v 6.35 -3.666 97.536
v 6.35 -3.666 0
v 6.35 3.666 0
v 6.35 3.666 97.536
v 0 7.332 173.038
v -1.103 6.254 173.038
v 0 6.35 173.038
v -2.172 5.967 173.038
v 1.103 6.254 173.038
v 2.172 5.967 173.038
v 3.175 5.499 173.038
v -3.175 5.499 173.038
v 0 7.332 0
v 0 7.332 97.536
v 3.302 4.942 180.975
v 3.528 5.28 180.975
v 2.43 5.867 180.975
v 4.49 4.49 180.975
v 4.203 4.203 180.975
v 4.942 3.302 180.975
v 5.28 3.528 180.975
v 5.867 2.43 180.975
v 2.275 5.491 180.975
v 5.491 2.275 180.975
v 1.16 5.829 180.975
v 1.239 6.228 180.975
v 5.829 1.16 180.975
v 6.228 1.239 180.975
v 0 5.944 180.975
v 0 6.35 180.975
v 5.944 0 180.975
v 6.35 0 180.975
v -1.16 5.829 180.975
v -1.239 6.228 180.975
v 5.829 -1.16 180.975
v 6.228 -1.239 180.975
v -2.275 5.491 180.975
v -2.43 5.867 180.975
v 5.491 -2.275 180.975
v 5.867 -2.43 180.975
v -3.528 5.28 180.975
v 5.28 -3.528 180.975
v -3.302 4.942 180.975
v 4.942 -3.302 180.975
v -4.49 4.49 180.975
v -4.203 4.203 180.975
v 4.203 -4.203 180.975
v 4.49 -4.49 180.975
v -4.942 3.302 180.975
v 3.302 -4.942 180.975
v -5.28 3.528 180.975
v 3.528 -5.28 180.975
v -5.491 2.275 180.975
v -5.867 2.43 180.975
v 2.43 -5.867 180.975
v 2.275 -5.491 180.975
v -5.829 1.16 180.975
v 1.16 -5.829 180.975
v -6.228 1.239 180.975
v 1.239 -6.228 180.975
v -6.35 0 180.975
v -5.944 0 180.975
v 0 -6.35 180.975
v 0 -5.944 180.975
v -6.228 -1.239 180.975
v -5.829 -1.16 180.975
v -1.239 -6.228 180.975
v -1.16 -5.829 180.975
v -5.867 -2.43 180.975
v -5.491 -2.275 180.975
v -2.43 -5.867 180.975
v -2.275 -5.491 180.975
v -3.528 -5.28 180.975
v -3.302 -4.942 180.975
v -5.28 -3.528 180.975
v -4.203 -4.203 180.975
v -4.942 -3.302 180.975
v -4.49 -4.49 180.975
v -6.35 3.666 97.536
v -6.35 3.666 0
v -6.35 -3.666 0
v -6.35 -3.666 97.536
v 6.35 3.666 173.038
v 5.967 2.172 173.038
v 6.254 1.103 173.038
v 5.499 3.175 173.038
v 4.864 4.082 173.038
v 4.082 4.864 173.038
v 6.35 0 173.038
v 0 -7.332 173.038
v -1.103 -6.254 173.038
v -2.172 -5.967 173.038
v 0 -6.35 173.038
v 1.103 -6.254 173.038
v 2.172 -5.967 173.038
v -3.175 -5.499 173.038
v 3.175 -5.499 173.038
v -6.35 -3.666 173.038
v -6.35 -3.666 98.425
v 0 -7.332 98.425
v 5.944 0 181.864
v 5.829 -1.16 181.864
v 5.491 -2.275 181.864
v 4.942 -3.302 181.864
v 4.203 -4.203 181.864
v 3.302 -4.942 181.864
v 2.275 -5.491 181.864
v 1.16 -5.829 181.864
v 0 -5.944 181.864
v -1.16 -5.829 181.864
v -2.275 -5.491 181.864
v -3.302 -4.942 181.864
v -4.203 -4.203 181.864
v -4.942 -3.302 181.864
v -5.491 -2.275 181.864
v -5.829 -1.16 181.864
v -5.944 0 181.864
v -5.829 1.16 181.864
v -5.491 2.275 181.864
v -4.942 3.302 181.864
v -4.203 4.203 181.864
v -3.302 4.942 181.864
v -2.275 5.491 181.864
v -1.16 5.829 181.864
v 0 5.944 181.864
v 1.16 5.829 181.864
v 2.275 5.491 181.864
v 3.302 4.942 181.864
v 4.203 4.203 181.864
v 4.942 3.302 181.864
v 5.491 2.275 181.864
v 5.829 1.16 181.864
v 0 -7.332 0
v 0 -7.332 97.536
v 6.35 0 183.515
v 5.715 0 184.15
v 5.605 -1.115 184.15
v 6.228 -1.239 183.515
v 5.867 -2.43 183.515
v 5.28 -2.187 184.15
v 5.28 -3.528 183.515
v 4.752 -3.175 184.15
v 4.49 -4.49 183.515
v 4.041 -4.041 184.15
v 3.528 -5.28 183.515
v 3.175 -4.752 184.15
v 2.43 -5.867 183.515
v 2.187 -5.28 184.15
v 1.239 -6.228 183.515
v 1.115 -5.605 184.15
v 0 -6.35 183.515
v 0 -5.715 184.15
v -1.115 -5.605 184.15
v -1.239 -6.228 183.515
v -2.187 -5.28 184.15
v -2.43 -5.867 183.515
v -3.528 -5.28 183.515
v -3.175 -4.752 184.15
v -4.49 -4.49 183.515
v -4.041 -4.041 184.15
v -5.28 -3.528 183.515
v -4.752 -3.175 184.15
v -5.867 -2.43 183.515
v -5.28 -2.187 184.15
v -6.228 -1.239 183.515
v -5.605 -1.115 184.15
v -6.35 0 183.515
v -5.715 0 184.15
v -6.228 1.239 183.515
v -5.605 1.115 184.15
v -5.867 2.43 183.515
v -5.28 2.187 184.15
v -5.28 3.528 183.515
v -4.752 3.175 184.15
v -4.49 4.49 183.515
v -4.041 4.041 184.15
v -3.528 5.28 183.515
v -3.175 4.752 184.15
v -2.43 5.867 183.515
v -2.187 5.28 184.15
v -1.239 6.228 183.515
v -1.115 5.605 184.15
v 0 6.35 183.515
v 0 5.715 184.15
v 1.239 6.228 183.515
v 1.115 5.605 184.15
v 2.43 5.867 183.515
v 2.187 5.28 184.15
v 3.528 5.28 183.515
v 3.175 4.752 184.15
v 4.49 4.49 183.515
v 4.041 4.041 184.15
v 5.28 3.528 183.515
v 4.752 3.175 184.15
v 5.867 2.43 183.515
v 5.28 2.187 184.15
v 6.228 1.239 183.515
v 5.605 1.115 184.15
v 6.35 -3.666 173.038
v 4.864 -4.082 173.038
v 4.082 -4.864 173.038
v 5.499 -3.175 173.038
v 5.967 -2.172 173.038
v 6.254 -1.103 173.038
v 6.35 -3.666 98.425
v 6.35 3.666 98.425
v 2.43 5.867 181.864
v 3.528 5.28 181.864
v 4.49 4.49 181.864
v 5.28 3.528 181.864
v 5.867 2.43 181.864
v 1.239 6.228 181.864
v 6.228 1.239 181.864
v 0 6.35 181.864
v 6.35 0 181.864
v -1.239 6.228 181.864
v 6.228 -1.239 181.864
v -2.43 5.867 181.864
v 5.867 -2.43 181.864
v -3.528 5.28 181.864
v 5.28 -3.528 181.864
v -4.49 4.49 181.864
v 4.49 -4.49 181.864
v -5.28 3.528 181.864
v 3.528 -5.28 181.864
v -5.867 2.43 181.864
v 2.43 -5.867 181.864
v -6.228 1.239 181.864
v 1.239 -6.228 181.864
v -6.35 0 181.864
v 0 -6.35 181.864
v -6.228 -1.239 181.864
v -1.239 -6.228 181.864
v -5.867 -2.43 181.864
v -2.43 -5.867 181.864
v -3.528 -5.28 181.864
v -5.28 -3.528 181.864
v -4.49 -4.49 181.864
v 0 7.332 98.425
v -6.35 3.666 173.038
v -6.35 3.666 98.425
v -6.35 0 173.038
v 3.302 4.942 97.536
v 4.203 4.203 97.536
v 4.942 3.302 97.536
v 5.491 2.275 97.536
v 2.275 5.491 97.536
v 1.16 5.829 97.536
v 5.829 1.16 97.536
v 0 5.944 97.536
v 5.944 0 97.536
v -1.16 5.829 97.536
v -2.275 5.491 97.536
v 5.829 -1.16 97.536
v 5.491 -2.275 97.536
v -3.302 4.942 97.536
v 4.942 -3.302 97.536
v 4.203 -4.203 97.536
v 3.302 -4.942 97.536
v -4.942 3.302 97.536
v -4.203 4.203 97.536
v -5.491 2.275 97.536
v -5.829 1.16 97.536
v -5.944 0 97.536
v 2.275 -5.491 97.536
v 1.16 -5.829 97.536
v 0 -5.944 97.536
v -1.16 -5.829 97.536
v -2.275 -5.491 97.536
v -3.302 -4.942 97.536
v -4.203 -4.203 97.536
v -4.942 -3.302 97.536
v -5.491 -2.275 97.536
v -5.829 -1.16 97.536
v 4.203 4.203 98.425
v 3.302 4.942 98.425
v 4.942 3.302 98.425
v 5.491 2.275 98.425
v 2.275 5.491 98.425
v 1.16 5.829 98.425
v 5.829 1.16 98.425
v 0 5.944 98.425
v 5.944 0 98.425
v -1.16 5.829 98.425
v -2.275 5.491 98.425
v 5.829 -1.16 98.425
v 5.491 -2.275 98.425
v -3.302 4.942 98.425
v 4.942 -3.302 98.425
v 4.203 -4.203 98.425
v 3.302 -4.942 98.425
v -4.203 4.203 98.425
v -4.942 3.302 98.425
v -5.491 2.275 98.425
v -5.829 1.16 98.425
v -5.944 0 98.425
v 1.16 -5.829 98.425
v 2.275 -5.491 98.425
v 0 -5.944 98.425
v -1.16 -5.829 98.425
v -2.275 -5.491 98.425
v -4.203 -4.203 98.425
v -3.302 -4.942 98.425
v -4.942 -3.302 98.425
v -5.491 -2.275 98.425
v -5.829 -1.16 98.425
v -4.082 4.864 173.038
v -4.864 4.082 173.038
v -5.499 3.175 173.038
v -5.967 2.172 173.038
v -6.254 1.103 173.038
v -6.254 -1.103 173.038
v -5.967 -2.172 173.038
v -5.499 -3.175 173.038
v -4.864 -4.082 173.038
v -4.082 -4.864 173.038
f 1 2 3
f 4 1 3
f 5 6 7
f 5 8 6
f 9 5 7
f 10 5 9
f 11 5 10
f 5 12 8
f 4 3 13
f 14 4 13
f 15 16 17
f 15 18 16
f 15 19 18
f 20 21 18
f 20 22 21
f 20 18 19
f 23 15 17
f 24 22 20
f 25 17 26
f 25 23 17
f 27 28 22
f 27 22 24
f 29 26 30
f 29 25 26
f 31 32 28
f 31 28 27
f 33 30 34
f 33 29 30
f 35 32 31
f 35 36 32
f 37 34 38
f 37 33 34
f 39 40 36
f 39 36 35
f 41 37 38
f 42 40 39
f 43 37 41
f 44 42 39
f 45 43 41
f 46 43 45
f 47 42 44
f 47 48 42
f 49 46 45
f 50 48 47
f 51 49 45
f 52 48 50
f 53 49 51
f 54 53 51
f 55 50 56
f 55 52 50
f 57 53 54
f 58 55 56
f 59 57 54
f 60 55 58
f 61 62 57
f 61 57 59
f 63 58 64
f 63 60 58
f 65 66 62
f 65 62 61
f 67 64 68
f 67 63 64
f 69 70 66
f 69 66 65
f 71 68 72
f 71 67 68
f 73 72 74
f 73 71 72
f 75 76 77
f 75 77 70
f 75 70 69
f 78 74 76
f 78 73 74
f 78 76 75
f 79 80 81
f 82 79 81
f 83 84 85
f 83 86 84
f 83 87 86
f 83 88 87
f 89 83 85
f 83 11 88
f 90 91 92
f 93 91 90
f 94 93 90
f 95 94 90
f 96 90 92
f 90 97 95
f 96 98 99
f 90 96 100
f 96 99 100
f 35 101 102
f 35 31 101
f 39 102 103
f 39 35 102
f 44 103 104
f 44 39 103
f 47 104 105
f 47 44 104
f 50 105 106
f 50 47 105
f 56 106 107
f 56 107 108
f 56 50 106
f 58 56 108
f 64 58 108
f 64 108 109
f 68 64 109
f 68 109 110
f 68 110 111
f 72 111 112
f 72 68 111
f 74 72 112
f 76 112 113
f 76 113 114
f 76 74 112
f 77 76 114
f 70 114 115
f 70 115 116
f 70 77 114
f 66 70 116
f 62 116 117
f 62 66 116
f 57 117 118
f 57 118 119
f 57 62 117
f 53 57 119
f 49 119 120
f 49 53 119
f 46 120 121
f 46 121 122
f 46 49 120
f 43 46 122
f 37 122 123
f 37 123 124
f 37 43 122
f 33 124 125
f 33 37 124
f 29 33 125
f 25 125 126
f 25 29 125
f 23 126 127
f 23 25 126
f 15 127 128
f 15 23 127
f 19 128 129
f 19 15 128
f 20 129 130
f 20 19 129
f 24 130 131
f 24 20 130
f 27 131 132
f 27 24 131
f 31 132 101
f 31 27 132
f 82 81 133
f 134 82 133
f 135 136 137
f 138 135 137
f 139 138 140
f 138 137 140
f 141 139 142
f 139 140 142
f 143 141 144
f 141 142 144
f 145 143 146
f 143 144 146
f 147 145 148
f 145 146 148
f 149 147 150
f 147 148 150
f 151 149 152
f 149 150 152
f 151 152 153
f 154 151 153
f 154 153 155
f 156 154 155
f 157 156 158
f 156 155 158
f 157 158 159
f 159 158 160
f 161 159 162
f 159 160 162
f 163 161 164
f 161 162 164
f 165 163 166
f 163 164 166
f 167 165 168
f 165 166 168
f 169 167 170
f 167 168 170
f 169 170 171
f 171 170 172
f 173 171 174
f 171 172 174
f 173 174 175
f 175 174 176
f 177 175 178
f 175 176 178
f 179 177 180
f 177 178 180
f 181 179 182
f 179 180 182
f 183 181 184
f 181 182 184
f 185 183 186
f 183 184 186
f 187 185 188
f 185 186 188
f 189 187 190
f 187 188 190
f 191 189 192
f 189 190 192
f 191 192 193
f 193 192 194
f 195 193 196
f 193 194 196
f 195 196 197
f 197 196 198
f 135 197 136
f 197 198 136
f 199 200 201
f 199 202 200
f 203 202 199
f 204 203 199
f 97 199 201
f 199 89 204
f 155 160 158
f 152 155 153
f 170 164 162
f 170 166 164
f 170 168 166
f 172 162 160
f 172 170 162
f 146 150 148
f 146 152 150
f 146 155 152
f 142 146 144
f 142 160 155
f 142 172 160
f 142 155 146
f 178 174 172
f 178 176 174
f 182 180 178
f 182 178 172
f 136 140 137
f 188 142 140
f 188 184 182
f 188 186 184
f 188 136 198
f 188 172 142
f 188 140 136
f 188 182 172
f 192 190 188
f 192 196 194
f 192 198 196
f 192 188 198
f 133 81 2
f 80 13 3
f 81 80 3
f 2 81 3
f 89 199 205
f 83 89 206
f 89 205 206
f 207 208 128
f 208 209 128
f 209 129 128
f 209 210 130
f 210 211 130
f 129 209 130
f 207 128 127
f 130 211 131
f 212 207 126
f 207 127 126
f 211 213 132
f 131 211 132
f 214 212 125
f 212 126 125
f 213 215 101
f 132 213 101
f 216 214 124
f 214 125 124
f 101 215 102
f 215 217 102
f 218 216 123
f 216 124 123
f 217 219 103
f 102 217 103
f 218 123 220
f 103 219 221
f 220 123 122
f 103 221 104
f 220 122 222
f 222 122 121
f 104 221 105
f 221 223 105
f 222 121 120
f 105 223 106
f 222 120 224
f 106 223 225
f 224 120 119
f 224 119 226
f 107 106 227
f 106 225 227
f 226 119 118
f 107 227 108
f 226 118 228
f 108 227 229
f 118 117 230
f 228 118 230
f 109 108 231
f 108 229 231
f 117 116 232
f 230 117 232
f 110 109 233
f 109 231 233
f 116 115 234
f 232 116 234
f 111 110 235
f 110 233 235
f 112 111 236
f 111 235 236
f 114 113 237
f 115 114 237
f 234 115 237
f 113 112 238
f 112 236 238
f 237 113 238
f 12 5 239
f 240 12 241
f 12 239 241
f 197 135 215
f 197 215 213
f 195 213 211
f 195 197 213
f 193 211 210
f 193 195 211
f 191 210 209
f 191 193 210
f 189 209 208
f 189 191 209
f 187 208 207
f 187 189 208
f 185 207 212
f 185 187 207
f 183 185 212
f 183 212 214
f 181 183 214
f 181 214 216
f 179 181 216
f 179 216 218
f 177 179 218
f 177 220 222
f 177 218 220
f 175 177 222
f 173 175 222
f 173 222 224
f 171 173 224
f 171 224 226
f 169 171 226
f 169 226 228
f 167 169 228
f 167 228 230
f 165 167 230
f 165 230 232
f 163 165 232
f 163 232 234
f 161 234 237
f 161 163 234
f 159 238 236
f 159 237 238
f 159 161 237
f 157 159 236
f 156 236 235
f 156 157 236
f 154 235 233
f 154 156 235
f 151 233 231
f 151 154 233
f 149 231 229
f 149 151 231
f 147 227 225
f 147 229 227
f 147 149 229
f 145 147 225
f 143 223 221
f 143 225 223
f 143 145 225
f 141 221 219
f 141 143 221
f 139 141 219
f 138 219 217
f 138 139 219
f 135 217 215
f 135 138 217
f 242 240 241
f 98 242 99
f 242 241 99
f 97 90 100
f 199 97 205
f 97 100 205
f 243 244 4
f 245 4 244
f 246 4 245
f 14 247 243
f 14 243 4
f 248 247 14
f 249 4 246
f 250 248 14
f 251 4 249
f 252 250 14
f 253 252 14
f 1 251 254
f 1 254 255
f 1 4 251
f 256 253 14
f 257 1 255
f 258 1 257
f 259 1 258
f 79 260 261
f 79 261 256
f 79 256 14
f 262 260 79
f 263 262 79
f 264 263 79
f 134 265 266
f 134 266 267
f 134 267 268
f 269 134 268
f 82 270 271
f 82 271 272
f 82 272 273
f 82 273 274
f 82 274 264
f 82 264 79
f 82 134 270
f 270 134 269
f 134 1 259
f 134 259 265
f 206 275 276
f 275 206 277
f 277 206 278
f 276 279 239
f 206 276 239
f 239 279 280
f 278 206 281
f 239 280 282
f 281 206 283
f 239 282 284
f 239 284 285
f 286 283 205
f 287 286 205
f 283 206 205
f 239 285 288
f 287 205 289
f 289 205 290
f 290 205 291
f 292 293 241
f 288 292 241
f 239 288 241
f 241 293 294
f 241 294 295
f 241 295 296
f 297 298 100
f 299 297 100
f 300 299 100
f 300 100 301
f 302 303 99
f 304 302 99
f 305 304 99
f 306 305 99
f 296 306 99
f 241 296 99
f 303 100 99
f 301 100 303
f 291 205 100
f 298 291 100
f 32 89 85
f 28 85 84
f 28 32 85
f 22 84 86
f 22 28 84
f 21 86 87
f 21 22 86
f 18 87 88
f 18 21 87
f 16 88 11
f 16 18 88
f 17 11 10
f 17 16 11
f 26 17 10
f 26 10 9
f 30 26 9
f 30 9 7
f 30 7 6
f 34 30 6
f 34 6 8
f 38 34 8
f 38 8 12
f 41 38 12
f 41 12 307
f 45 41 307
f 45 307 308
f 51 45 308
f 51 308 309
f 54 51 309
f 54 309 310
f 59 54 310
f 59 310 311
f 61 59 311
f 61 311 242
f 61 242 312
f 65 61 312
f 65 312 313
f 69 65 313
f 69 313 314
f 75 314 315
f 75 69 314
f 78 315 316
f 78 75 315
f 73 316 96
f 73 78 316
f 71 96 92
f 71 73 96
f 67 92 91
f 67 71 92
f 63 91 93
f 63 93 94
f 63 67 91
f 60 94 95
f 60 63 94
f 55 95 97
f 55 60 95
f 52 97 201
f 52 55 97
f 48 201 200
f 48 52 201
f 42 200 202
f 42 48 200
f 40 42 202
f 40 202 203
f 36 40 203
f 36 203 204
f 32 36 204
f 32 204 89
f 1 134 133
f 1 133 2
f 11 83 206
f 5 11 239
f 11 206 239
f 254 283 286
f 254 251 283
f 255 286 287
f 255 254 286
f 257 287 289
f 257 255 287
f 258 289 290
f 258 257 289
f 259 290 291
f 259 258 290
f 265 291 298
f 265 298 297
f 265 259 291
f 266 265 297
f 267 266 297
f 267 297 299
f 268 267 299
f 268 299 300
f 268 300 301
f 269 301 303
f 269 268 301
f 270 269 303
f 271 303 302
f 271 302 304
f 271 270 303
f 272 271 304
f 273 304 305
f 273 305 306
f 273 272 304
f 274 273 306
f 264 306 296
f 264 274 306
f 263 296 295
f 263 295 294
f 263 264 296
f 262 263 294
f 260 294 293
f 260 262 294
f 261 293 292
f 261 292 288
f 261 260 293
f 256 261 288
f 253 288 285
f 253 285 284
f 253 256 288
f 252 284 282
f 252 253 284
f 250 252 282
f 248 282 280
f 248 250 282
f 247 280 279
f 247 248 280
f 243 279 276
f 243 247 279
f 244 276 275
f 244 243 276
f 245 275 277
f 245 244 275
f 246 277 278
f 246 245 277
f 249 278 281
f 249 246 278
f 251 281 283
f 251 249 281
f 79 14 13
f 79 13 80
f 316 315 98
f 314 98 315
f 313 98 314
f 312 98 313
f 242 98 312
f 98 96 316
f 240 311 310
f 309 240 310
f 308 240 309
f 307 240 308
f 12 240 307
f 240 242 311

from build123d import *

# Parameters (mm, degrees)
BOSS_EXTRUDE1_DEPTH = 184.15
SKETCH2_R           = 7.332348419
SKETCH2_R_2         = 6.35
CUT_EXTRUDE1_DEPTH  = 11.1125
SKETCH3_W           = 0.889
SKETCH3_H           = 0.4064
SKETCH3_H_2         = 3.038077808
CHAMFER1_SIZE       = 0.635


with BuildPart() as part:
    # Sketch1 → Boss-Extrude1 (new body)
    with BuildSketch(Plane.XY):
        Polygon((0, 7.332348419), (-6.35, 3.666174209), (-6.35, -3.666174209), (0, -7.332348419), (6.35, -3.666174209), (6.35, 3.666174209), align=None)
    extrude(amount=BOSS_EXTRUDE1_DEPTH)

    # Sketch2 → Cut-Extrude1 (cut)
    with BuildSketch(Plane.XY.offset(184.15)):
        Circle(SKETCH2_R)
        Circle(SKETCH2_R_2, mode=Mode.SUBTRACT)
    extrude(amount=-CUT_EXTRUDE1_DEPTH, mode=Mode.SUBTRACT)

    # Sketch3 → Cut-Revolve1 (revolve, cut)
    with BuildSketch(Plane(origin=(0, 0, 0), x_dir=(0, 0, -1), z_dir=(1, 0, 0)), mode=Mode.PRIVATE) as cut_revolve1_sk:
        with Locations((-181.4195, 6.1468)):
            Rectangle(SKETCH3_W, SKETCH3_H)
        with Locations((-97.9805, 7.462638904)):
            Rectangle(SKETCH3_W, SKETCH3_H_2)
    revolve(cut_revolve1_sk.sketch.rotate(Axis((0, 0, 184.15), (0, 0, -1)), 90), axis=Axis((0, 0, 184.15), (0, 0, -1)), mode=Mode.SUBTRACT)

    # Chamfer1
    chamfer1_edges = [part.edges().sort_by_distance(p)[0] for p in [
        (-6.35, 0, 184.15),
    ]]
    chamfer(chamfer1_edges, length=CHAMFER1_SIZE)


solid = part.part
